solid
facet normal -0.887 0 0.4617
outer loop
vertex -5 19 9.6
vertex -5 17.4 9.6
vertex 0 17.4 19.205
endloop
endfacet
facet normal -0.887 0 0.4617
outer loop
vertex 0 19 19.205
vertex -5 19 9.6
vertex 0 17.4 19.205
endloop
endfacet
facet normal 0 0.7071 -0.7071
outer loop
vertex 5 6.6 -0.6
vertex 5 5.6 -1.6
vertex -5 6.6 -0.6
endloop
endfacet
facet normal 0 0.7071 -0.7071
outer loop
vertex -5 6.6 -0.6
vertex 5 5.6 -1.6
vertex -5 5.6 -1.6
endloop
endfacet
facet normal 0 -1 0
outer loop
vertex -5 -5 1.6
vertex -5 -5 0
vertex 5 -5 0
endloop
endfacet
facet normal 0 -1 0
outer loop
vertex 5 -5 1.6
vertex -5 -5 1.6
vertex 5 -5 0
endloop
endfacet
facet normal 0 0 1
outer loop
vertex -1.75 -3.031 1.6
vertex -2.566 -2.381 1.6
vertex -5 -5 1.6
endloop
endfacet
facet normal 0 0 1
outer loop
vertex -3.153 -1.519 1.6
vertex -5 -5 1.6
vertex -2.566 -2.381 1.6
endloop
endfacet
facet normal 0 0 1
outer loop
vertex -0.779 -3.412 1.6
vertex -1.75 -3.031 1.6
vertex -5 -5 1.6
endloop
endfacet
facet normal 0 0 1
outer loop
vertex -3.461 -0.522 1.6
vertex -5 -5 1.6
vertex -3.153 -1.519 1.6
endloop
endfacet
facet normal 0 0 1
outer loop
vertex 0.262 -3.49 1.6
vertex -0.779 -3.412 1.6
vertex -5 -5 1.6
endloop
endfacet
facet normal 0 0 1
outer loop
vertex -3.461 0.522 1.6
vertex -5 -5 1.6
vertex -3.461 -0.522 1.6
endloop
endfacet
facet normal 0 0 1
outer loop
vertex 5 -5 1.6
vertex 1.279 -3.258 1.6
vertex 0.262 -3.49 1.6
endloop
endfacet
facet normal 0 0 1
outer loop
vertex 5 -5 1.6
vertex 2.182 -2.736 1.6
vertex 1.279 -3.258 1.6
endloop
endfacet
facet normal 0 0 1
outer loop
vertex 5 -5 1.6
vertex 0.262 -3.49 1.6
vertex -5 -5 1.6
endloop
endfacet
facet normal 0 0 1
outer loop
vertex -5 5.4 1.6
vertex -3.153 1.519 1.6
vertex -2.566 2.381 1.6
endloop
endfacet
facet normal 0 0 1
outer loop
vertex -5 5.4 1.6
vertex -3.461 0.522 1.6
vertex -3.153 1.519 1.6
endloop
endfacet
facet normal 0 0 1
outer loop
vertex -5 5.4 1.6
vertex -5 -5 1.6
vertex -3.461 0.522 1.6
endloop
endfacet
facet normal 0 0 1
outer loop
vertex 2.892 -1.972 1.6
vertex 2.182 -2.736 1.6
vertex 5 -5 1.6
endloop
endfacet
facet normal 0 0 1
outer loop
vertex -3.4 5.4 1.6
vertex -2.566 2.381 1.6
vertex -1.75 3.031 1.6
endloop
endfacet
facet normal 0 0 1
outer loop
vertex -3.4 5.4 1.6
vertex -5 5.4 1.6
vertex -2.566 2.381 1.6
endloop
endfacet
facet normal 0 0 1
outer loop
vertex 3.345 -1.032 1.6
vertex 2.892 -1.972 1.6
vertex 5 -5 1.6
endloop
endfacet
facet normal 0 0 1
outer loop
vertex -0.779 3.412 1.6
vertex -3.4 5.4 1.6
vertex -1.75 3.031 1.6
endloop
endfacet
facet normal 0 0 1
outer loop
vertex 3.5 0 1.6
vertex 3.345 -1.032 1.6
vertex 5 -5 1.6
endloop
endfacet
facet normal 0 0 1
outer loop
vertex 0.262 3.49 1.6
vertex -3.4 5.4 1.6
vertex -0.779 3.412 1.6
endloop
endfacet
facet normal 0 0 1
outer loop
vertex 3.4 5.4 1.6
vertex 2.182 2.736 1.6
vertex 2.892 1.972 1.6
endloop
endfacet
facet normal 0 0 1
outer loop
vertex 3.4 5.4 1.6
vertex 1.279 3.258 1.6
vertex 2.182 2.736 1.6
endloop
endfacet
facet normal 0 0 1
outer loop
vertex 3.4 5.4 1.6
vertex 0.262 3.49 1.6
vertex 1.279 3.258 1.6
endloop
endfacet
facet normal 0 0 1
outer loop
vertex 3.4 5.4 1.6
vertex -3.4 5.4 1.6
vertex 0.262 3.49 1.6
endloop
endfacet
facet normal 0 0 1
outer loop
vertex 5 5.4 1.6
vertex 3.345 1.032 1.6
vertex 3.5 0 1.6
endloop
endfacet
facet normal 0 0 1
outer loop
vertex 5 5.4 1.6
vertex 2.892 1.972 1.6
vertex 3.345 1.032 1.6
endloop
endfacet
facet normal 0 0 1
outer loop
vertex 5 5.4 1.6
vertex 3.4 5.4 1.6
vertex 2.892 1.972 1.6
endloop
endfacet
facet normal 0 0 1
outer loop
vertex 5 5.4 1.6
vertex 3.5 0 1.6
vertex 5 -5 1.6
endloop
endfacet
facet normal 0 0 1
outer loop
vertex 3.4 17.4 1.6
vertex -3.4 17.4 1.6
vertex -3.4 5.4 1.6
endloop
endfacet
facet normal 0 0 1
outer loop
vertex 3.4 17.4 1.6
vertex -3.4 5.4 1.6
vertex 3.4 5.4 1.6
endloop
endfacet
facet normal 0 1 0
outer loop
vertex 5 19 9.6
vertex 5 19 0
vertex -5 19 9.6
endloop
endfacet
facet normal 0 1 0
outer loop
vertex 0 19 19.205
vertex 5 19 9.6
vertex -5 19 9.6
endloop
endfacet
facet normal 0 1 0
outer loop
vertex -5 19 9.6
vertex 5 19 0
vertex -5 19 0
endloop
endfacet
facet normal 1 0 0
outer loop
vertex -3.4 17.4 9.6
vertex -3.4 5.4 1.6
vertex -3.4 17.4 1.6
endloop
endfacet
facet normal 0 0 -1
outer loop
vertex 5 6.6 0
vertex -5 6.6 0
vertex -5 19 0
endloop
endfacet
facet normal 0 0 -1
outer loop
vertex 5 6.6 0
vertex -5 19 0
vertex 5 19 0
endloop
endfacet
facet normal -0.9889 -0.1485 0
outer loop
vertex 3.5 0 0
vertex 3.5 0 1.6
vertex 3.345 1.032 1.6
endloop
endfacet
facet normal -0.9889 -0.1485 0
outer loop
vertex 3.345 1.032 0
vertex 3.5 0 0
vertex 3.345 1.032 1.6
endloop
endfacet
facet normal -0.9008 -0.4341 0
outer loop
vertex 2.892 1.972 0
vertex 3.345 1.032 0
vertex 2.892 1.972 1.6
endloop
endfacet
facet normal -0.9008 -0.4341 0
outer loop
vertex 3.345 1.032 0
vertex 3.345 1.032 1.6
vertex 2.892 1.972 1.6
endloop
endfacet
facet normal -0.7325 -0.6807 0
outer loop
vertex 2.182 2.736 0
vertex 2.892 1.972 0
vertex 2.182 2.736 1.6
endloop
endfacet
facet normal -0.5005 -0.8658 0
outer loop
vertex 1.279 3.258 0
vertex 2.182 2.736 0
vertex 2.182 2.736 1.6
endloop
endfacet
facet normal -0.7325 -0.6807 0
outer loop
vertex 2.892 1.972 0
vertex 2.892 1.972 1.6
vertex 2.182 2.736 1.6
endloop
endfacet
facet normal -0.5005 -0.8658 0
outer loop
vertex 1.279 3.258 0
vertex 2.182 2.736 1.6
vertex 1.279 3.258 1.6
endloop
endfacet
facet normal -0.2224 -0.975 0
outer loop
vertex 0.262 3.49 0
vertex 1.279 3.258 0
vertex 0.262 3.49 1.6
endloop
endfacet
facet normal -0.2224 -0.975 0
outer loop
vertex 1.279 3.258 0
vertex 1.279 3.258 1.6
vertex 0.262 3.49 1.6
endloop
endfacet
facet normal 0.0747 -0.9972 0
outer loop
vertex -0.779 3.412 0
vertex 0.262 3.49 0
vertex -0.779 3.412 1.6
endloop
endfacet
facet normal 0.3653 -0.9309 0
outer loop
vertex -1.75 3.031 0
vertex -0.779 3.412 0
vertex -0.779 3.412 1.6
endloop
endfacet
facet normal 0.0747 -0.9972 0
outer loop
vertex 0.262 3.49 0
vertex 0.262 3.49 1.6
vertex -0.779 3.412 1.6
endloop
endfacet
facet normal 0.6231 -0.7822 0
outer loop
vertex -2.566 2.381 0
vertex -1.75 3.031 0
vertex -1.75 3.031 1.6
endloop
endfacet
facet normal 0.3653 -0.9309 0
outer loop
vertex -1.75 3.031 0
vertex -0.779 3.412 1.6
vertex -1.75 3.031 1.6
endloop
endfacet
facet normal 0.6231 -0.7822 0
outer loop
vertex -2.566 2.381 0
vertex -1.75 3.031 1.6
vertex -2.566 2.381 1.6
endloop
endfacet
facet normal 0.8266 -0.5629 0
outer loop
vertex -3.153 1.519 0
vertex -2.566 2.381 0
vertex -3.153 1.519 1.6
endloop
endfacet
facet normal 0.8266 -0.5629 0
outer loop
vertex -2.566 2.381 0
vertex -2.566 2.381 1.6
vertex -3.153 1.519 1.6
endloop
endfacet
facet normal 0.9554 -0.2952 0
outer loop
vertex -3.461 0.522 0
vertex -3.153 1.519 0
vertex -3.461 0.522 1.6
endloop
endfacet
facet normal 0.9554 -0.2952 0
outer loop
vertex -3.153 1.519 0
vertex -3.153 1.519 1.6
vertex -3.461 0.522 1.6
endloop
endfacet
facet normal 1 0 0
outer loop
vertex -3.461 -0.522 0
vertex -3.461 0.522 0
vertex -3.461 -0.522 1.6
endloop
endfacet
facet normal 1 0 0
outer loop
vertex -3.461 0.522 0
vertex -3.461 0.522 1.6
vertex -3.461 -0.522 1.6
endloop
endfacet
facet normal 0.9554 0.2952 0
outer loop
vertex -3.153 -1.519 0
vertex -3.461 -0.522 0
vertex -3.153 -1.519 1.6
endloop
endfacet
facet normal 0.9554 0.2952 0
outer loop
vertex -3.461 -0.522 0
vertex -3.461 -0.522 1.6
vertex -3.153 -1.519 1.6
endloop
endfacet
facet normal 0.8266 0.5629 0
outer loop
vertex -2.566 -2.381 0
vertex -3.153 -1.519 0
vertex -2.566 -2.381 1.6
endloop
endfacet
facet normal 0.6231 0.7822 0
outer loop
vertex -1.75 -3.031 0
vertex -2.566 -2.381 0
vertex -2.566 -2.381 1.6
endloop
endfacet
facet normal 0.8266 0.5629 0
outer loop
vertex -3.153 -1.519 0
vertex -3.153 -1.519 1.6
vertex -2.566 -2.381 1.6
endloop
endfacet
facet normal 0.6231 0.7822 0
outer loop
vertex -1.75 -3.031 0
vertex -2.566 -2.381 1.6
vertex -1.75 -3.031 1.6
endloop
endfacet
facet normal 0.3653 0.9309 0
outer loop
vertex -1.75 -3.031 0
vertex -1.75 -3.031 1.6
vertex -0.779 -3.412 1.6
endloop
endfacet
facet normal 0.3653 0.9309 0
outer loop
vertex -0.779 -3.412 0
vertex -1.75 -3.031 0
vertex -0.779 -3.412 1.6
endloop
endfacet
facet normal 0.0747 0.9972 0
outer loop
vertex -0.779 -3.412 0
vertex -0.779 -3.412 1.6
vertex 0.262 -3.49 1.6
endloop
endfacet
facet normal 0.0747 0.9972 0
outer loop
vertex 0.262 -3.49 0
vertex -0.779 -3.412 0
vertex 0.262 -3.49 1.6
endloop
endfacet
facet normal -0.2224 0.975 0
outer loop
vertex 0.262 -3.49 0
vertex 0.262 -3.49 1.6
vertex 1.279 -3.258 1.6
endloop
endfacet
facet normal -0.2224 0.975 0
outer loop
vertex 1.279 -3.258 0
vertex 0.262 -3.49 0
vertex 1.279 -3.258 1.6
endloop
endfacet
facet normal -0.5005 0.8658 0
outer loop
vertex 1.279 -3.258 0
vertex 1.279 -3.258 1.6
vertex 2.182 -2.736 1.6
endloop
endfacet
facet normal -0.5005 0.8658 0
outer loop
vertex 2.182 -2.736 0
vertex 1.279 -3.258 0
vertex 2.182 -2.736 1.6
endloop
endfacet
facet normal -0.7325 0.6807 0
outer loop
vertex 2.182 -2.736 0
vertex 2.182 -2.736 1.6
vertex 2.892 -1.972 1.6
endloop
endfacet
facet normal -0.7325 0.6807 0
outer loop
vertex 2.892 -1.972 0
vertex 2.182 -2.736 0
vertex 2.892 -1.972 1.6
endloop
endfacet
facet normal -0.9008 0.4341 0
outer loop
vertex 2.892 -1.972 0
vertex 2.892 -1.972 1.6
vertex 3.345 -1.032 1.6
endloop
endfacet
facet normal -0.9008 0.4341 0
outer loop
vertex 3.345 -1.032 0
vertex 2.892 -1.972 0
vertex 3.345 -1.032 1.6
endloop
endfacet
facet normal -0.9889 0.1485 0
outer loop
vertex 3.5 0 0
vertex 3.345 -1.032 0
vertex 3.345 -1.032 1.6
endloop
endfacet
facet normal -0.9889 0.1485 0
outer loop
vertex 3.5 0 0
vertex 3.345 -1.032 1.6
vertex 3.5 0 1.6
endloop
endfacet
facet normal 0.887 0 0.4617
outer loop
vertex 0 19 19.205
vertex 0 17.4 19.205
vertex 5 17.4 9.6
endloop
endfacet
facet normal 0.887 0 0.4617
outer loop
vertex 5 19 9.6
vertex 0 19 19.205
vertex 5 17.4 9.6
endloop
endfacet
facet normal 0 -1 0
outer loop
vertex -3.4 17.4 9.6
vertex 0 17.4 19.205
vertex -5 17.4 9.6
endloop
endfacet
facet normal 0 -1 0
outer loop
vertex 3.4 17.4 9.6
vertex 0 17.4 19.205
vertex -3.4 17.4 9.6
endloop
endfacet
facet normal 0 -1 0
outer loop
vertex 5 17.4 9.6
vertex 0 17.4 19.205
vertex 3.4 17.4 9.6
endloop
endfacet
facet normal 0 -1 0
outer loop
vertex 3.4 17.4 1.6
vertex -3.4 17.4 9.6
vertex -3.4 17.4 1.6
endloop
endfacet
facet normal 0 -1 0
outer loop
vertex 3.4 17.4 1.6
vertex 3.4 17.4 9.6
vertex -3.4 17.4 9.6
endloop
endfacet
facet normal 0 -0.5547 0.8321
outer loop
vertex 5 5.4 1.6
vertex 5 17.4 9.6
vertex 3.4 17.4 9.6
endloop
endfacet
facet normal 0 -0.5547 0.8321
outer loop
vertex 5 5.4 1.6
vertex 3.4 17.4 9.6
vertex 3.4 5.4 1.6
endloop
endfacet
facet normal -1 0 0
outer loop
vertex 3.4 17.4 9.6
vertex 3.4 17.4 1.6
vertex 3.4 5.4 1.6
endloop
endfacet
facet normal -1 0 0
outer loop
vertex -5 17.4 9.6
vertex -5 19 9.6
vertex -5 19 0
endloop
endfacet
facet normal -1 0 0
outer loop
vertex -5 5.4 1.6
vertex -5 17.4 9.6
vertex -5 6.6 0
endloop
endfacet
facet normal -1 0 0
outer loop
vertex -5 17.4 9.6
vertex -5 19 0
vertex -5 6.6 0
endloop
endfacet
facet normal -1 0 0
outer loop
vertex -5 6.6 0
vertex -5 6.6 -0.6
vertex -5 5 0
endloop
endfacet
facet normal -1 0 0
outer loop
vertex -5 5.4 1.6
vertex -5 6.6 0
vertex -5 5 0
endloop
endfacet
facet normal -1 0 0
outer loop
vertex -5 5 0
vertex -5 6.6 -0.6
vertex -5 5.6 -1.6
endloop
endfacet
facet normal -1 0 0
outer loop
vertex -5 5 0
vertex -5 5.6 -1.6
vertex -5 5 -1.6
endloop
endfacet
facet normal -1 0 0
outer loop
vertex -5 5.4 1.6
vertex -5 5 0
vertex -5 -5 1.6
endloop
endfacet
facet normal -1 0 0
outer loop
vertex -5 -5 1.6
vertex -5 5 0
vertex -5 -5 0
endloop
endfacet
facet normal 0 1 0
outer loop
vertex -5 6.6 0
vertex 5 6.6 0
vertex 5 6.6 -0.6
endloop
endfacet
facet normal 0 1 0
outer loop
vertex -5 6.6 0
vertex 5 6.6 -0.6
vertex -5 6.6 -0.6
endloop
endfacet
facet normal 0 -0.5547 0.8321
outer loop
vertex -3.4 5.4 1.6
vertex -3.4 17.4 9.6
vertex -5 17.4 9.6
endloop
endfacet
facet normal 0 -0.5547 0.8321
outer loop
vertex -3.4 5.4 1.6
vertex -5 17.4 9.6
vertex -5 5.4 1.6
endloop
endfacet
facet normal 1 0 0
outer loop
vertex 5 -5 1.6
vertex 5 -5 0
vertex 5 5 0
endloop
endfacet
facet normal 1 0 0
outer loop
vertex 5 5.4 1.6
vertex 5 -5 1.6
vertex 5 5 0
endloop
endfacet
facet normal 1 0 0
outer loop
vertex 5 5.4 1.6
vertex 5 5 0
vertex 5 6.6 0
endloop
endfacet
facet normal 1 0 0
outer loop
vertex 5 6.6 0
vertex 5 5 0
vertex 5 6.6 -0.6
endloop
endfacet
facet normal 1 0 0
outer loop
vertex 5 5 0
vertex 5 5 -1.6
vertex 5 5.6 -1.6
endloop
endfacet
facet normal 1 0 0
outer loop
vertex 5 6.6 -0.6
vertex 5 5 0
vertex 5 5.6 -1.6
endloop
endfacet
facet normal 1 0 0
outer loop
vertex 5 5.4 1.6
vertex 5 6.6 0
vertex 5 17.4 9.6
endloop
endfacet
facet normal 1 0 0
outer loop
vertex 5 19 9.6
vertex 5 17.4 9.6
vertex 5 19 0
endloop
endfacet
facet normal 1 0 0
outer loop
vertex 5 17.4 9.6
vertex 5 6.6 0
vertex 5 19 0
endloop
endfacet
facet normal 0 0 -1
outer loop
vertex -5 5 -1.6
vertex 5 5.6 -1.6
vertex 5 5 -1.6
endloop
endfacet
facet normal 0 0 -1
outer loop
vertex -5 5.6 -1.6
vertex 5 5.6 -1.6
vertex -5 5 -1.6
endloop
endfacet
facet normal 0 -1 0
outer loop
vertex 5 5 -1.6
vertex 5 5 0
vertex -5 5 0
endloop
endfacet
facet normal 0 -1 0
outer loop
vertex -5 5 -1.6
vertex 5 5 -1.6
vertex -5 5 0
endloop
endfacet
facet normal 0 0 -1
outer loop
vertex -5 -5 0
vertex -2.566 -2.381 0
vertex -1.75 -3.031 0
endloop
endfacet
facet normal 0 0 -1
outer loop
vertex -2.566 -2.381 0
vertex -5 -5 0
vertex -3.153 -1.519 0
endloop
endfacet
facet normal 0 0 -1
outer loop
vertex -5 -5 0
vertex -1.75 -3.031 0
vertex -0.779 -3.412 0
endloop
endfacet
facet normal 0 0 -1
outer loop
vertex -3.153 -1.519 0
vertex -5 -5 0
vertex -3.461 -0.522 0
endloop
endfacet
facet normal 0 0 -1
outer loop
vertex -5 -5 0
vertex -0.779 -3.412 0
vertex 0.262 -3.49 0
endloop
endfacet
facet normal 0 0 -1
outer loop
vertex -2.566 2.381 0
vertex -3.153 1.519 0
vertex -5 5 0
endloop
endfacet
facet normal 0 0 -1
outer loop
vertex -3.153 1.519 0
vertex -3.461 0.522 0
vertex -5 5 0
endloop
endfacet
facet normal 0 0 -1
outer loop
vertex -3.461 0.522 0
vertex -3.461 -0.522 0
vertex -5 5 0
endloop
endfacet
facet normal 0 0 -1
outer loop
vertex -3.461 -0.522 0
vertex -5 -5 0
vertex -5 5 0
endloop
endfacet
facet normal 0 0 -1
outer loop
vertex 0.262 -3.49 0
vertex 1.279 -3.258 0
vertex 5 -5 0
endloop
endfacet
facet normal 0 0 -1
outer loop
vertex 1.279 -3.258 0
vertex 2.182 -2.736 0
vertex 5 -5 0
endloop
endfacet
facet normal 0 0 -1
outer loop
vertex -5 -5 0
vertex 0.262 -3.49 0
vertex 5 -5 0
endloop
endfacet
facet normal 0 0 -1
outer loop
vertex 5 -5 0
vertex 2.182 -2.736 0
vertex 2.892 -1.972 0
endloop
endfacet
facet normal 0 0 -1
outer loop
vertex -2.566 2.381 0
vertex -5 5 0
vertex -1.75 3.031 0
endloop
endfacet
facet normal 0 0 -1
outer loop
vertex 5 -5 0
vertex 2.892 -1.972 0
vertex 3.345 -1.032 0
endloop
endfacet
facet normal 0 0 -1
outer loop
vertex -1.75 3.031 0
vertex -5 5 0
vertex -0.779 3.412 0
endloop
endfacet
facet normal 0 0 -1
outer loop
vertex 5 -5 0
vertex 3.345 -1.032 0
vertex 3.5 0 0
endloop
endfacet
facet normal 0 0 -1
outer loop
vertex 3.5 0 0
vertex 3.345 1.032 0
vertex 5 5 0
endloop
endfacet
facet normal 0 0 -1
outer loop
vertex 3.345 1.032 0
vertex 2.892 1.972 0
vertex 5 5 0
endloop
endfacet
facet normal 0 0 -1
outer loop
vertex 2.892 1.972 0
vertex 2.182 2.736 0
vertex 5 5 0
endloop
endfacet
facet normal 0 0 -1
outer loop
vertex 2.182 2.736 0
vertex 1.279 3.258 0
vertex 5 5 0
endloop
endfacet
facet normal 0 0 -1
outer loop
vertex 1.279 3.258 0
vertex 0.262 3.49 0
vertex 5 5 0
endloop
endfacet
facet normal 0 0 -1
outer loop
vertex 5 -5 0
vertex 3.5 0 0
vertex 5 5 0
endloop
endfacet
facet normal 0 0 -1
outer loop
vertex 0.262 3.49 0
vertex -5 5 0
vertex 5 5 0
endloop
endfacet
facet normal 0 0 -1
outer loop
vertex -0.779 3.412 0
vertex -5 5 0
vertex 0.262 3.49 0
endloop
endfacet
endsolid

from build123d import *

# Parameters (mm, degrees)
SKETCH1_W           = 10
SKETCH1_H           = 24
BODY_DEPTH          = 1.6
SKETCH2_W           = 10
SKETCH2_H           = 1.6
BOSS_EXTRUDE2_DEPTH = 1.6
FIN_CHAMFER_SIZE    = 1
SKETCH3_R           = 3.5
HOLE_DEPTH          = 4.2
FIN_DEPTH           = 17.604910635
SIDE_CUT_DEPTH      = 11
TOP_CUT_DEPTH       = 2.6


with BuildPart() as part:
    # Sketch1 → Body (new body)
    with BuildSketch(Plane.XY):
        with Locations((0, 7)):
            Rectangle(SKETCH1_W, SKETCH1_H)
    extrude(amount=BODY_DEPTH)

    # Sketch2 → Boss-Extrude2 (add)
    with BuildSketch(Plane(origin=(0, 0, 0), x_dir=(-1, 0, 0), z_dir=(0, 0, -1))):
        with Locations((0, 5.8)):
            Rectangle(SKETCH2_W, SKETCH2_H)
    extrude(amount=BOSS_EXTRUDE2_DEPTH)

    # Fin Chamfer
    fin_chamfer_edges = [part.edges().sort_by_distance(p)[0] for p in [
        (0, 6.6, -1.6),
    ]]
    chamfer(fin_chamfer_edges, length=FIN_CHAMFER_SIZE)

    # Sketch3 → Hole (cut, through all)
    with BuildSketch(Plane.XY.offset(1.6)):
        Circle(SKETCH3_R)
    extrude(amount=-HOLE_DEPTH, mode=Mode.SUBTRACT)

    # Sketch4 → Fin (add)
    with BuildSketch(Plane.XY.offset(1.6)):
        Polygon((-5, 19), (-5, 5.4), (-3.4, 5.4), (-3.4, 17.4), (3.4, 17.4), (3.4, 5.4), (5, 5.4), (5, 19), align=None)
    extrude(amount=FIN_DEPTH)

    # Sketch5 → Side Cut (cut, through all)
    with BuildSketch(Plane(origin=(5, 0, 0), x_dir=(0, 0, -1), z_dir=(1, 0, 0))):
        Polygon((-1.6, 5.4), (-9.6, 5.4), (-19.204910635, 5.4), (-19.204910635, 17.4), (-9.6, 17.4), align=None)
    extrude(amount=-SIDE_CUT_DEPTH, mode=Mode.SUBTRACT)

    # Sketch7 → Top Cut (cut, through all)
    with BuildSketch(Plane.XZ.offset(-17.4)):
        Polygon((-5, 19.204910635), (-5, 9.6), (0, 19.204910635), align=None)
        Polygon((5, 19.204910635), (0, 19.204910635), (5, 9.6), align=None)
    extrude(amount=-TOP_CUT_DEPTH, mode=Mode.SUBTRACT)


solid = part.part
